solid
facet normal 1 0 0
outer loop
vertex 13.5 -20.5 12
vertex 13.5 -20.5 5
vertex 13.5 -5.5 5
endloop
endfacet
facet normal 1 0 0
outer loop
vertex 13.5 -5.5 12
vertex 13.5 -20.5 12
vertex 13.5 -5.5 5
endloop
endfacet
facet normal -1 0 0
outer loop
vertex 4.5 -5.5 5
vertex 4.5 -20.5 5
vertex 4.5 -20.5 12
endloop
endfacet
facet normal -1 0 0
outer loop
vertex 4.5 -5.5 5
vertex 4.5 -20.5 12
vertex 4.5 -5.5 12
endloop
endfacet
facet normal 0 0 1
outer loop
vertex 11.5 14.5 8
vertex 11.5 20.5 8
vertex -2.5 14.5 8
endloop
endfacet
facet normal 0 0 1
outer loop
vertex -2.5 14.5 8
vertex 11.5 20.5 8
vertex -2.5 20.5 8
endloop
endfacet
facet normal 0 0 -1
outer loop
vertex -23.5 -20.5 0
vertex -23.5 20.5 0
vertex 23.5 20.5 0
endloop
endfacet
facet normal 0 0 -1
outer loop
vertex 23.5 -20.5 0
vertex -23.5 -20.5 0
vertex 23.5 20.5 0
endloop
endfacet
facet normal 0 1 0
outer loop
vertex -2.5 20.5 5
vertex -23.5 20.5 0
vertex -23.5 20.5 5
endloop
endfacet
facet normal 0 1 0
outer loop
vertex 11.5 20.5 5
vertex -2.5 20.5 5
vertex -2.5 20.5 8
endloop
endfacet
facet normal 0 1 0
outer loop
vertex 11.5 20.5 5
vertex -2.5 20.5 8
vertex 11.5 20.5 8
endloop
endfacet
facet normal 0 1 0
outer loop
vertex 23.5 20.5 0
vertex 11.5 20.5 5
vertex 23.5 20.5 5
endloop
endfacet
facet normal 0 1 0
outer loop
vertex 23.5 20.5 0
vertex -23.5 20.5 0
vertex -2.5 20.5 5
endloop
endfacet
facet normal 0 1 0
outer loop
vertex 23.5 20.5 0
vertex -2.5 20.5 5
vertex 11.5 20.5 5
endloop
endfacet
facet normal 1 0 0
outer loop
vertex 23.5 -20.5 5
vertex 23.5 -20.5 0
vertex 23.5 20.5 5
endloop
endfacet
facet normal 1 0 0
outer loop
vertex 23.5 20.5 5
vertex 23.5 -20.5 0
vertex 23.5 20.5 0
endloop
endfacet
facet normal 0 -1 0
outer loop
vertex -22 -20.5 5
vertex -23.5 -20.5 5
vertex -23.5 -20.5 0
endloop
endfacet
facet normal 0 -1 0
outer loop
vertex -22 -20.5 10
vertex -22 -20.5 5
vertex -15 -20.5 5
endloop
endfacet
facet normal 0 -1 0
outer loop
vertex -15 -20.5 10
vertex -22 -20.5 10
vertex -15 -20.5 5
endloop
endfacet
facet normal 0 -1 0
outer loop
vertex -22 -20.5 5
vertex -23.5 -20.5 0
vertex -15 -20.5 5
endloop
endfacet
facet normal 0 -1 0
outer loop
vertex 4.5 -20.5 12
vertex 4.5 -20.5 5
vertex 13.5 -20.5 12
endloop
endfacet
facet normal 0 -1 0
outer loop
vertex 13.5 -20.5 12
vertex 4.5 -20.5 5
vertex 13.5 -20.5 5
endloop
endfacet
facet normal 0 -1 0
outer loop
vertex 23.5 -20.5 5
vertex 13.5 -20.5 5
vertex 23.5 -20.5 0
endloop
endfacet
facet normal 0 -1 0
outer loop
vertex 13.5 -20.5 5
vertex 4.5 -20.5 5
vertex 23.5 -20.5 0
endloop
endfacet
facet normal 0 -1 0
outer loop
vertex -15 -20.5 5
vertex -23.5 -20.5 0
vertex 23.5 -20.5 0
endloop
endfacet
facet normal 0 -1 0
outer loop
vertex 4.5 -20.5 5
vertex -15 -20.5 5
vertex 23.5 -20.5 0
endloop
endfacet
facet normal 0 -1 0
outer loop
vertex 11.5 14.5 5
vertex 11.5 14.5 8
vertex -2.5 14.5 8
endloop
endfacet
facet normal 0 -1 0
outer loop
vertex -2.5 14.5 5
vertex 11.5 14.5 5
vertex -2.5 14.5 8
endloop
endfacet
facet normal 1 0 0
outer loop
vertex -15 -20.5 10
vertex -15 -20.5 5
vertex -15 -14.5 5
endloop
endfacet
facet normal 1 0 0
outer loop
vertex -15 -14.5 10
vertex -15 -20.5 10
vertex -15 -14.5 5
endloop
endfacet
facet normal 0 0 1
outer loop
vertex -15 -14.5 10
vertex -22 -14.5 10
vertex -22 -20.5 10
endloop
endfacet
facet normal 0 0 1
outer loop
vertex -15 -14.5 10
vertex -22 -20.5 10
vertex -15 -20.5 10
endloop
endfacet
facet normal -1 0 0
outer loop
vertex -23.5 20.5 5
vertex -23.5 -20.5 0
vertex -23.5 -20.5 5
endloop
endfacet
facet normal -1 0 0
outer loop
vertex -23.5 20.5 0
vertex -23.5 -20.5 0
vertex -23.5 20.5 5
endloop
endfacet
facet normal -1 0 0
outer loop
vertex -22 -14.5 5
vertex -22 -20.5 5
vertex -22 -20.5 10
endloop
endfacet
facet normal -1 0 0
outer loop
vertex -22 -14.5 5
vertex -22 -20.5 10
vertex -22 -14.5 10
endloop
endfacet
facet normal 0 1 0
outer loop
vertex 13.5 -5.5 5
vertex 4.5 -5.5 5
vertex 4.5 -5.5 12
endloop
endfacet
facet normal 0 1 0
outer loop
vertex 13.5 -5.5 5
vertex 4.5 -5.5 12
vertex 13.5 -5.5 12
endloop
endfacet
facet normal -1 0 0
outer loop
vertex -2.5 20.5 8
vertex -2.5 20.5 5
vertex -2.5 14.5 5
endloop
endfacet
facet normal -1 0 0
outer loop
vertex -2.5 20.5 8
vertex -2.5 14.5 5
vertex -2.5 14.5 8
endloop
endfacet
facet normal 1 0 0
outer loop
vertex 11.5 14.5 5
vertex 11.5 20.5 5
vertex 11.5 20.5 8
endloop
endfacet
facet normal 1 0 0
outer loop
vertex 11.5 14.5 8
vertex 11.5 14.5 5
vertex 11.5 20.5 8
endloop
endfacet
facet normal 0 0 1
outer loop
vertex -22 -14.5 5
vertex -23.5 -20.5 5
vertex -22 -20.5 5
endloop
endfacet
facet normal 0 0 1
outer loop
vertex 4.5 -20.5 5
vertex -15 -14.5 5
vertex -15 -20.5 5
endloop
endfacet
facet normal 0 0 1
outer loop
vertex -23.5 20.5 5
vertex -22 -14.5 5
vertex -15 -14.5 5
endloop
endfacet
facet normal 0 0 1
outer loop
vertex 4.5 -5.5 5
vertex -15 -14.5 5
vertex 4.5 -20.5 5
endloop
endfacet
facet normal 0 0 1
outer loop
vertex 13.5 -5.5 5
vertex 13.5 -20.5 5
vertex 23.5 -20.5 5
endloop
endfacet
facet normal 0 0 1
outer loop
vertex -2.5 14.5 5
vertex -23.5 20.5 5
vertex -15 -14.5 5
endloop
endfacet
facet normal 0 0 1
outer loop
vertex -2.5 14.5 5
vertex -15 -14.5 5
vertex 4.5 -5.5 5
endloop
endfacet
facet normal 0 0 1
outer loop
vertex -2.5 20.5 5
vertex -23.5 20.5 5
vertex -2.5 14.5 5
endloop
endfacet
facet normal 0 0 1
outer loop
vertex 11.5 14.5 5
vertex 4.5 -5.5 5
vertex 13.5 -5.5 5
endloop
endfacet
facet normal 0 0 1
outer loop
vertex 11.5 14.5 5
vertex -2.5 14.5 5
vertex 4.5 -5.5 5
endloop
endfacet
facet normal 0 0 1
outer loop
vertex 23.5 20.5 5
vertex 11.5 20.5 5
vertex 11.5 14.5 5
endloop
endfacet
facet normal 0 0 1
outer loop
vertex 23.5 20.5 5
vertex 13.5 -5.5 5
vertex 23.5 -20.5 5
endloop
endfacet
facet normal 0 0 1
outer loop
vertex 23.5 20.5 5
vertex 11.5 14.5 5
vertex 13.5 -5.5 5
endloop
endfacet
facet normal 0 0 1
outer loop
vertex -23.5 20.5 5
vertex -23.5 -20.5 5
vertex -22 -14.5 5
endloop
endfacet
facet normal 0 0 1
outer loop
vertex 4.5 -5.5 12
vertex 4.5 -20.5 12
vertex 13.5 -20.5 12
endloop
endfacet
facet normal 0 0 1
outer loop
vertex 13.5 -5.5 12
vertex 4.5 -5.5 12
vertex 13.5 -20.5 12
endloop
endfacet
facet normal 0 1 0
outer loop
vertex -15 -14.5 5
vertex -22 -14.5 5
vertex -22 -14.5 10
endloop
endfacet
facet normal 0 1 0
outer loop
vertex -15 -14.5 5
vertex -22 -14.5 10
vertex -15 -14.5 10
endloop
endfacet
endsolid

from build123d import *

# Parameters (mm, degrees)
SKETCH_W     = 47
SKETCH_H     = 41
PAD_DEPTH    = 1
SKETCH001_W  = 9
SKETCH001_H  = 15
PAD001_DEPTH = 11
SKETCH002_W  = 7
SKETCH002_H  = 6
PAD002_DEPTH = 9
SKETCH003_W  = 47
SKETCH003_H  = 41
PAD003_DEPTH = 4
SKETCH011_W  = 14
SKETCH011_H  = 7
PAD006_DEPTH = 6


with BuildPart() as part:
    # Sketch → Pad (new body)
    with BuildSketch(Plane.XY):
        Rectangle(SKETCH_W, SKETCH_H)
    extrude(amount=PAD_DEPTH)

    # Sketch001 (on Face6 of Pad) → Pad001 (join)
    with BuildSketch(Plane.XY.offset(1)):
        with Locations((9, -13)):
            Rectangle(SKETCH001_W, SKETCH001_H)
    extrude(amount=PAD001_DEPTH)

    # Sketch002 (on Face5 of Pad001) → Pad002 (join)
    with BuildSketch(Plane.XY.offset(1)):
        with Locations((-18.5, -17.5)):
            Rectangle(SKETCH002_W, SKETCH002_H)
    extrude(amount=PAD002_DEPTH)

    # Sketch003 (on Face5 of Pad002) → Pad003 (join)
    with BuildSketch(Plane.XY.offset(1)):
        Rectangle(SKETCH003_W, SKETCH003_H)
    extrude(amount=PAD003_DEPTH)

    # Sketch011 (on Face5 of Pad003) → Pad006 (join)
    with BuildSketch(Plane(origin=(0, 20.5, 0), x_dir=(-1, 0, 0), z_dir=(0, 1, 0))):
        with Locations((-4.5, 4.5)):
            Rectangle(SKETCH011_W, SKETCH011_H)
    extrude(amount=-PAD006_DEPTH)


solid = part.part
